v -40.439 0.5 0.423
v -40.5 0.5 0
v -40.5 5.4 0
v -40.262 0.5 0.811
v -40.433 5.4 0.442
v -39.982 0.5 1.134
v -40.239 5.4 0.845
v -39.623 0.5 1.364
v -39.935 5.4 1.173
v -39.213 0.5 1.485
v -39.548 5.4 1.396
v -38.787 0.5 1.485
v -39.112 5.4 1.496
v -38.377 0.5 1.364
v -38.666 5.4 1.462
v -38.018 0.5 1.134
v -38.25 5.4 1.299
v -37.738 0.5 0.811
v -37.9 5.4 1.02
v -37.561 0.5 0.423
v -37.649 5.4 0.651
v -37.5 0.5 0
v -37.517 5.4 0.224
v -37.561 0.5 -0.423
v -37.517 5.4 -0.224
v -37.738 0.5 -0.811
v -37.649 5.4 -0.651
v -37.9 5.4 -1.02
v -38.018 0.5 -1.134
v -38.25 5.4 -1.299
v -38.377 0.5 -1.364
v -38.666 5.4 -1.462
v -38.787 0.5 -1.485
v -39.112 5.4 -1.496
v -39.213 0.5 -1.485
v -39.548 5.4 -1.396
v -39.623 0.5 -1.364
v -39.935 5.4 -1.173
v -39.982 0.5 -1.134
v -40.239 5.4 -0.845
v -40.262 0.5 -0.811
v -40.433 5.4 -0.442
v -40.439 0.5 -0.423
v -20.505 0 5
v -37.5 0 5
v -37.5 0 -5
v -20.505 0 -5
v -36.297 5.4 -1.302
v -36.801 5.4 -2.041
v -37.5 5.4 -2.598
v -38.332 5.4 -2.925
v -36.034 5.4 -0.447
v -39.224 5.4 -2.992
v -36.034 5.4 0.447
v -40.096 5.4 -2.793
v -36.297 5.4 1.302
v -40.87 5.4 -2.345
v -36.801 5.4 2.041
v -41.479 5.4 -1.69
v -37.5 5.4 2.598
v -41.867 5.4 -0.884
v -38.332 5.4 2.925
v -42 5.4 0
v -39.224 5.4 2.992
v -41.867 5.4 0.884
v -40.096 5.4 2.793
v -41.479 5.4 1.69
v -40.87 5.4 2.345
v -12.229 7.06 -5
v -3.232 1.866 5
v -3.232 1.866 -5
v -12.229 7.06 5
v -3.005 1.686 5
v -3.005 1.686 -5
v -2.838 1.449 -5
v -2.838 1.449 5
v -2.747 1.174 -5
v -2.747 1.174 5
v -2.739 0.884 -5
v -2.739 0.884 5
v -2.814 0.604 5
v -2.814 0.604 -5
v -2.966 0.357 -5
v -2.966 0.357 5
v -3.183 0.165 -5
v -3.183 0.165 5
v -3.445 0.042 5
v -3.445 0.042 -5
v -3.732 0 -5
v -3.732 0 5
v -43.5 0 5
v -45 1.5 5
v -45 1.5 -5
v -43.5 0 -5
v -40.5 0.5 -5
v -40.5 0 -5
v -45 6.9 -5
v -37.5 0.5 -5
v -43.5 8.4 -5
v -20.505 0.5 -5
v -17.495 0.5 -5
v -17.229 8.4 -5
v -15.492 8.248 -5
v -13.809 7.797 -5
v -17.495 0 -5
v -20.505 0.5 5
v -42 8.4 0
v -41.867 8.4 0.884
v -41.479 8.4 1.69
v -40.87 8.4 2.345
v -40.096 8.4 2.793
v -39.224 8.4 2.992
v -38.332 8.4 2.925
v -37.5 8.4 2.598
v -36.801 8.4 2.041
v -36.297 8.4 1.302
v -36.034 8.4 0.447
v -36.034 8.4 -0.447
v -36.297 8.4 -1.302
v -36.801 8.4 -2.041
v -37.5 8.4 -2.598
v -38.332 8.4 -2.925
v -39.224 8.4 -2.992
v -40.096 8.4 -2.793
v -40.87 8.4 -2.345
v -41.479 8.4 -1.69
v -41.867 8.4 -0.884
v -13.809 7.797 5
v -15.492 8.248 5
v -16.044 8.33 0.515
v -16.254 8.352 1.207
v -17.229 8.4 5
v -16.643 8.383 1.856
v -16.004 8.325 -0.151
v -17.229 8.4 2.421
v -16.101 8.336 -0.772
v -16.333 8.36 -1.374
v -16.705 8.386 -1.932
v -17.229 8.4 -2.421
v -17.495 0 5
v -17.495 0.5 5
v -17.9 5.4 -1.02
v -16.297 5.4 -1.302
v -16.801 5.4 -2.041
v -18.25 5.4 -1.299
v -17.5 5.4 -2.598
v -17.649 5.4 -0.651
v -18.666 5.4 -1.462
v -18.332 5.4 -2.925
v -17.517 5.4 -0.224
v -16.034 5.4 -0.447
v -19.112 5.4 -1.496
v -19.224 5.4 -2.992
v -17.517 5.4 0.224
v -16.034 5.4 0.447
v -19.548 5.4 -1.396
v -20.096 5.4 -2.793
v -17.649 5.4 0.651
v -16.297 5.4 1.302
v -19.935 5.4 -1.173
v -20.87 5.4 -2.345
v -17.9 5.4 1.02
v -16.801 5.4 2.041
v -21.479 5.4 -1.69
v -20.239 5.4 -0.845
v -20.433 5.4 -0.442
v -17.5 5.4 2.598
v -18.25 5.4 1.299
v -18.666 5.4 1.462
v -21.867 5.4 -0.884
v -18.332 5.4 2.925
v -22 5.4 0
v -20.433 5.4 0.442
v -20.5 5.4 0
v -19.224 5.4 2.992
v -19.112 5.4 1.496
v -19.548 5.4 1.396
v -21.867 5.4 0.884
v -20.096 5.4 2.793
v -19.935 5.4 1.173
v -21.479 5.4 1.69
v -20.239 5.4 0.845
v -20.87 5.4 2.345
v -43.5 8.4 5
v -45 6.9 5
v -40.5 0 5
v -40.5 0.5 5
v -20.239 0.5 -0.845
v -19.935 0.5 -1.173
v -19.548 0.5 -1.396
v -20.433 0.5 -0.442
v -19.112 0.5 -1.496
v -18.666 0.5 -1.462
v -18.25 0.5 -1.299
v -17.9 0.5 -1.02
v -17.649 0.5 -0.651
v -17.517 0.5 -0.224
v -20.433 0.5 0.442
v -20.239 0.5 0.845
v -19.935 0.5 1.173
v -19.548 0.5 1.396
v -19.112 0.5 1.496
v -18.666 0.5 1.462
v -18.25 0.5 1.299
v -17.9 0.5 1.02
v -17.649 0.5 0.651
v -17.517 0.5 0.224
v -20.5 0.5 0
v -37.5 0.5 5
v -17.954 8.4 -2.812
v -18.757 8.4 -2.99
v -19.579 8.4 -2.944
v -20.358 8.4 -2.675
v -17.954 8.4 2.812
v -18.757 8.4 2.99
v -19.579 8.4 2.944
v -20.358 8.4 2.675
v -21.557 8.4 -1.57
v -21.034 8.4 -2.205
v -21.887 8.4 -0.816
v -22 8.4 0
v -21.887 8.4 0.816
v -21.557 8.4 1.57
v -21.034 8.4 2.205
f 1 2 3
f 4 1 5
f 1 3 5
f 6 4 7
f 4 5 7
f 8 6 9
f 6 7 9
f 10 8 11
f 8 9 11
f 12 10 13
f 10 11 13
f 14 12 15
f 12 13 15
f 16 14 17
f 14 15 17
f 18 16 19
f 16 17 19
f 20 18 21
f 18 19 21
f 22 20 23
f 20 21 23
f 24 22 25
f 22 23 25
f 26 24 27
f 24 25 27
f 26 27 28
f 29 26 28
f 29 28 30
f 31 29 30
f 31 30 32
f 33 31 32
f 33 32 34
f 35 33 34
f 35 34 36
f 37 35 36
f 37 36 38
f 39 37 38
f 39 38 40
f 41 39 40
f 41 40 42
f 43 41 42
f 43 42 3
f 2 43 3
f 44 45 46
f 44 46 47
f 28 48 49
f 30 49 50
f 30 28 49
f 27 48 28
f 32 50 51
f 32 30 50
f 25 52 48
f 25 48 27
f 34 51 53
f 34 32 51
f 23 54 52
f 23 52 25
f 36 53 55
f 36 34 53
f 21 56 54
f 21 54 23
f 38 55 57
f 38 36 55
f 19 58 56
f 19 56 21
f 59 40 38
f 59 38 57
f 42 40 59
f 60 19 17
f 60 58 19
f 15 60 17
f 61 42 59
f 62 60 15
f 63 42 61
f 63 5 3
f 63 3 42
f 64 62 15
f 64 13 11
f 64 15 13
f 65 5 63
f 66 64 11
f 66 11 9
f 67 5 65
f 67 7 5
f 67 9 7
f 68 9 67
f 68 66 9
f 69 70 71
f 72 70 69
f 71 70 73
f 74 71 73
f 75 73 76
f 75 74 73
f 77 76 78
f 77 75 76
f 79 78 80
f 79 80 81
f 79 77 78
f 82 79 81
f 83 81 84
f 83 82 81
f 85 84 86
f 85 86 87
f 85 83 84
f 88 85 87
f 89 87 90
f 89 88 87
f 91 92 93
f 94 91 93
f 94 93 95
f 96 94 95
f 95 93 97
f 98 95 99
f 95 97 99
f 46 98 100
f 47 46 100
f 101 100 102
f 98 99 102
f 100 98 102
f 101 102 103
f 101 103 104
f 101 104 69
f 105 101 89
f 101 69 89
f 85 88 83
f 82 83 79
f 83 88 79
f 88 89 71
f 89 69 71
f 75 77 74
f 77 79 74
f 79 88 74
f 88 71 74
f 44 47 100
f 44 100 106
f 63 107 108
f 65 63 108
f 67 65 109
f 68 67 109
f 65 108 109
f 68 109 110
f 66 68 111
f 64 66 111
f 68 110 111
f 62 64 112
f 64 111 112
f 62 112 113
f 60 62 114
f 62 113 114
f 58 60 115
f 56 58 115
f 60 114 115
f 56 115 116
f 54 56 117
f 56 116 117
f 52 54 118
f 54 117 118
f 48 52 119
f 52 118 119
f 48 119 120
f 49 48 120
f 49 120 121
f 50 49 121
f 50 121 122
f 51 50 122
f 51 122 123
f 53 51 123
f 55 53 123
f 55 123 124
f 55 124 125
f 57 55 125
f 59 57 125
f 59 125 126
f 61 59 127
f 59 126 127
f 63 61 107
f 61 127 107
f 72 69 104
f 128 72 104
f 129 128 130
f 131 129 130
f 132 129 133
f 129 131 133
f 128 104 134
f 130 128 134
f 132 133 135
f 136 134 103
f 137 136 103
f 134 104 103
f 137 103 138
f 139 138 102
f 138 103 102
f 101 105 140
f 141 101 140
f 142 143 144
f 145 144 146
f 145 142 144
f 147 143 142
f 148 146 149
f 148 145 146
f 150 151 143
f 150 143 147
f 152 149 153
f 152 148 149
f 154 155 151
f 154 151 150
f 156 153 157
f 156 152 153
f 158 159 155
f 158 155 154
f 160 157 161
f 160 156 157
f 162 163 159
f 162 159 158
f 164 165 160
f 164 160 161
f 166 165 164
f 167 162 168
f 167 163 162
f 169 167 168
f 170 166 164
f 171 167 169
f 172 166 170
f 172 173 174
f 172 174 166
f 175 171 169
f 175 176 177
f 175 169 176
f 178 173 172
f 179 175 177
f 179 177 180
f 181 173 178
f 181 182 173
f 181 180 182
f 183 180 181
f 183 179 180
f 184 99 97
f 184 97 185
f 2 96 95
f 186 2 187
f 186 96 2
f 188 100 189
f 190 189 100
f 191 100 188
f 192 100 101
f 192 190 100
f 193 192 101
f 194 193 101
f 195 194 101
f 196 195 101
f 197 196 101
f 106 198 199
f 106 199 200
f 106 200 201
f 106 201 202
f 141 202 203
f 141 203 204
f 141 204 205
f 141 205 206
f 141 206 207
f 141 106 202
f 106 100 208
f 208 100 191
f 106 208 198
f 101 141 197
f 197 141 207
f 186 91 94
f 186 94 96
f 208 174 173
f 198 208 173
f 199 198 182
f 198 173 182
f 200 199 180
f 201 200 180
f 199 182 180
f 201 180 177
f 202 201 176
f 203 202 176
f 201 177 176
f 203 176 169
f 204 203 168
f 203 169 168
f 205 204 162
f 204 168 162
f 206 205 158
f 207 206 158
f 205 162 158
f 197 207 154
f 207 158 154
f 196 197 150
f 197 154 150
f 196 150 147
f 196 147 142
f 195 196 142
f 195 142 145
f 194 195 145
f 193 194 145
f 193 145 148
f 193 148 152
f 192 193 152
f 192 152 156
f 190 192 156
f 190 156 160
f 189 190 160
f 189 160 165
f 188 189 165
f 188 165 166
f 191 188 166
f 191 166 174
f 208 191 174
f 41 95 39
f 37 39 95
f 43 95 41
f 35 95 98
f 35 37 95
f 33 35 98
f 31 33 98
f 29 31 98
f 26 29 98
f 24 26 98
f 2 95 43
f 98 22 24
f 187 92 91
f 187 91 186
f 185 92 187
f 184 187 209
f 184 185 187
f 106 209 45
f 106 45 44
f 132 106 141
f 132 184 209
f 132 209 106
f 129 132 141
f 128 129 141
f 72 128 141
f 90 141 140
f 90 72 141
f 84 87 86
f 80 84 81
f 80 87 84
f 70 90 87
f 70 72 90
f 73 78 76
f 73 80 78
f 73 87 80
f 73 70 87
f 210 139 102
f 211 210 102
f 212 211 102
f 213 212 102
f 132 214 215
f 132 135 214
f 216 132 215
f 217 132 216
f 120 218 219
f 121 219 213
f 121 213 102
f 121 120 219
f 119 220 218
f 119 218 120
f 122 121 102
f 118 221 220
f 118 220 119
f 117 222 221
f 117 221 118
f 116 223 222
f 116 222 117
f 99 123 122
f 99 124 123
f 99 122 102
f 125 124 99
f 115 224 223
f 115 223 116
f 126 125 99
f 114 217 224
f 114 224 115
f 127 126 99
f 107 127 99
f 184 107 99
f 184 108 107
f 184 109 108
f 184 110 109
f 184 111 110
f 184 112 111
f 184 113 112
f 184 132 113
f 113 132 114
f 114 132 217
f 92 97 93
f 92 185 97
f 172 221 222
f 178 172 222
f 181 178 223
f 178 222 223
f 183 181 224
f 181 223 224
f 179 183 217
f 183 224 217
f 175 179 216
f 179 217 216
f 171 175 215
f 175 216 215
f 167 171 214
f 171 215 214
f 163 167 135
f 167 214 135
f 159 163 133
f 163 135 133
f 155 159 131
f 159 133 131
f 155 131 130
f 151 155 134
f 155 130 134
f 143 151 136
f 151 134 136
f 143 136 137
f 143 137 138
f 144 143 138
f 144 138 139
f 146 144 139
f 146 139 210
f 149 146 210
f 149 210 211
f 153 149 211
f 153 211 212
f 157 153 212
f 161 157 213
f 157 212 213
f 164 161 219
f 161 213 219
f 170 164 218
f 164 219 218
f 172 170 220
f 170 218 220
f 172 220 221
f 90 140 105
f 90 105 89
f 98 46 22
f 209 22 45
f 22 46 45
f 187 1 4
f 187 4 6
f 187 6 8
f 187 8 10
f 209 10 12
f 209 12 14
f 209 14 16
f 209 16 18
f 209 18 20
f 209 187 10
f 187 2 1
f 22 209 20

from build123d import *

# Parameters (mm, degrees)
EXTRUDE_1_DEPTH     = 5
SKETCH_2_R          = 1.5
CUT_EXTRUDE_1_DEPTH = 47.049538543
SKETCH_3_R          = 3
CUT_EXTRUDE_2_DEPTH = 3
FILLET_1_R          = 10
FILLET_2_R          = 1
CHAMFER_1_SIZE      = 1.5
SKETCH_4_W          = 3
SKETCH_4_H          = 10
SKETCH_4_W_2        = 3.010676302
CUT_EXTRUDE_3_DEPTH = 0.5


with BuildPart() as part:
    # 草图1 → 凸台-拉伸1 (new, symmetric)
    with BuildSketch(Plane.XY):
        Polygon((0, 0), (-14.549226784, 8.4), (-45, 8.4), (-45, 0), align=None)
    extrude(amount=EXTRUDE_1_DEPTH, both=True)

    # 草图2 → 切除-拉伸1 (cut, through all)
    with BuildSketch(Plane(origin=(0, 8.4, 0), x_dir=(1, 0, 0), z_dir=(0, 1, 0))):
        with Locations(Location((-39, 0, 0), (0, 0, 180))):
            Circle(SKETCH_2_R)
        with Locations(Location((-19, 0, 0), (0, 0, 180))):
            Circle(SKETCH_2_R)
    extrude(amount=-CUT_EXTRUDE_1_DEPTH, mode=Mode.SUBTRACT)

    # 草图3 → 切除-拉伸2 (cut)
    with BuildSketch(Plane(origin=(0, 8.4, 0), x_dir=(1, 0, 0), z_dir=(0, 1, 0))):
        with Locations(Location((-39, 0, 0), (0, 0, 180))):
            Circle(SKETCH_3_R)
        with Locations(Location((-19, 0, 0), (0, 0, 180))):
            Circle(SKETCH_3_R)
    extrude(amount=-CUT_EXTRUDE_2_DEPTH, mode=Mode.SUBTRACT)

    # 圆角1
    # the kernel refuses this fillet: 10 mm, written as the material it takes off along each edge
    with BuildSketch(Plane(origin=(-14.549226784, 8.4, -11.698729811), x_dir=(0.8660254037844417, -0.4999999999999948, 0), z_dir=(0, 0, 1))) as fillet_1_piece_1:
        with BuildLine():
            CenterArc((FILLET_1_R * 0.267949192431, -FILLET_1_R), FILLET_1_R, 90, 30)
            Line((-FILLET_1_R * 0.232050807569, -FILLET_1_R * 0.133974596216), (0, 0))
            Line((0, 0), (FILLET_1_R * 0.267949192431, 0))
        make_face()
    extrude(amount=23.397459622, mode=Mode.SUBTRACT)

    # 圆角2
    fillet_2_edges = [part.edges().sort_by_distance(p)[0] for p in [
        (0, 0, 0),
    ]]
    fillet(fillet_2_edges, radius=FILLET_2_R)

    # 倒角1
    chamfer_1_edges = [part.edges().sort_by_distance(p)[0] for p in [
        (-45, 0, 0),
        (-45, 8.4, 0),
    ]]
    chamfer(chamfer_1_edges, length=CHAMFER_1_SIZE)

    # 草图4 → 切除-拉伸3 (cut)
    with BuildSketch(Plane.XZ):
        with Locations((-39, 0)):
            Rectangle(SKETCH_4_W, SKETCH_4_H)
        with Locations((-19, 0)):
            Rectangle(SKETCH_4_W_2, SKETCH_4_H)
    extrude(amount=-CUT_EXTRUDE_3_DEPTH, mode=Mode.SUBTRACT)


solid = part.part
